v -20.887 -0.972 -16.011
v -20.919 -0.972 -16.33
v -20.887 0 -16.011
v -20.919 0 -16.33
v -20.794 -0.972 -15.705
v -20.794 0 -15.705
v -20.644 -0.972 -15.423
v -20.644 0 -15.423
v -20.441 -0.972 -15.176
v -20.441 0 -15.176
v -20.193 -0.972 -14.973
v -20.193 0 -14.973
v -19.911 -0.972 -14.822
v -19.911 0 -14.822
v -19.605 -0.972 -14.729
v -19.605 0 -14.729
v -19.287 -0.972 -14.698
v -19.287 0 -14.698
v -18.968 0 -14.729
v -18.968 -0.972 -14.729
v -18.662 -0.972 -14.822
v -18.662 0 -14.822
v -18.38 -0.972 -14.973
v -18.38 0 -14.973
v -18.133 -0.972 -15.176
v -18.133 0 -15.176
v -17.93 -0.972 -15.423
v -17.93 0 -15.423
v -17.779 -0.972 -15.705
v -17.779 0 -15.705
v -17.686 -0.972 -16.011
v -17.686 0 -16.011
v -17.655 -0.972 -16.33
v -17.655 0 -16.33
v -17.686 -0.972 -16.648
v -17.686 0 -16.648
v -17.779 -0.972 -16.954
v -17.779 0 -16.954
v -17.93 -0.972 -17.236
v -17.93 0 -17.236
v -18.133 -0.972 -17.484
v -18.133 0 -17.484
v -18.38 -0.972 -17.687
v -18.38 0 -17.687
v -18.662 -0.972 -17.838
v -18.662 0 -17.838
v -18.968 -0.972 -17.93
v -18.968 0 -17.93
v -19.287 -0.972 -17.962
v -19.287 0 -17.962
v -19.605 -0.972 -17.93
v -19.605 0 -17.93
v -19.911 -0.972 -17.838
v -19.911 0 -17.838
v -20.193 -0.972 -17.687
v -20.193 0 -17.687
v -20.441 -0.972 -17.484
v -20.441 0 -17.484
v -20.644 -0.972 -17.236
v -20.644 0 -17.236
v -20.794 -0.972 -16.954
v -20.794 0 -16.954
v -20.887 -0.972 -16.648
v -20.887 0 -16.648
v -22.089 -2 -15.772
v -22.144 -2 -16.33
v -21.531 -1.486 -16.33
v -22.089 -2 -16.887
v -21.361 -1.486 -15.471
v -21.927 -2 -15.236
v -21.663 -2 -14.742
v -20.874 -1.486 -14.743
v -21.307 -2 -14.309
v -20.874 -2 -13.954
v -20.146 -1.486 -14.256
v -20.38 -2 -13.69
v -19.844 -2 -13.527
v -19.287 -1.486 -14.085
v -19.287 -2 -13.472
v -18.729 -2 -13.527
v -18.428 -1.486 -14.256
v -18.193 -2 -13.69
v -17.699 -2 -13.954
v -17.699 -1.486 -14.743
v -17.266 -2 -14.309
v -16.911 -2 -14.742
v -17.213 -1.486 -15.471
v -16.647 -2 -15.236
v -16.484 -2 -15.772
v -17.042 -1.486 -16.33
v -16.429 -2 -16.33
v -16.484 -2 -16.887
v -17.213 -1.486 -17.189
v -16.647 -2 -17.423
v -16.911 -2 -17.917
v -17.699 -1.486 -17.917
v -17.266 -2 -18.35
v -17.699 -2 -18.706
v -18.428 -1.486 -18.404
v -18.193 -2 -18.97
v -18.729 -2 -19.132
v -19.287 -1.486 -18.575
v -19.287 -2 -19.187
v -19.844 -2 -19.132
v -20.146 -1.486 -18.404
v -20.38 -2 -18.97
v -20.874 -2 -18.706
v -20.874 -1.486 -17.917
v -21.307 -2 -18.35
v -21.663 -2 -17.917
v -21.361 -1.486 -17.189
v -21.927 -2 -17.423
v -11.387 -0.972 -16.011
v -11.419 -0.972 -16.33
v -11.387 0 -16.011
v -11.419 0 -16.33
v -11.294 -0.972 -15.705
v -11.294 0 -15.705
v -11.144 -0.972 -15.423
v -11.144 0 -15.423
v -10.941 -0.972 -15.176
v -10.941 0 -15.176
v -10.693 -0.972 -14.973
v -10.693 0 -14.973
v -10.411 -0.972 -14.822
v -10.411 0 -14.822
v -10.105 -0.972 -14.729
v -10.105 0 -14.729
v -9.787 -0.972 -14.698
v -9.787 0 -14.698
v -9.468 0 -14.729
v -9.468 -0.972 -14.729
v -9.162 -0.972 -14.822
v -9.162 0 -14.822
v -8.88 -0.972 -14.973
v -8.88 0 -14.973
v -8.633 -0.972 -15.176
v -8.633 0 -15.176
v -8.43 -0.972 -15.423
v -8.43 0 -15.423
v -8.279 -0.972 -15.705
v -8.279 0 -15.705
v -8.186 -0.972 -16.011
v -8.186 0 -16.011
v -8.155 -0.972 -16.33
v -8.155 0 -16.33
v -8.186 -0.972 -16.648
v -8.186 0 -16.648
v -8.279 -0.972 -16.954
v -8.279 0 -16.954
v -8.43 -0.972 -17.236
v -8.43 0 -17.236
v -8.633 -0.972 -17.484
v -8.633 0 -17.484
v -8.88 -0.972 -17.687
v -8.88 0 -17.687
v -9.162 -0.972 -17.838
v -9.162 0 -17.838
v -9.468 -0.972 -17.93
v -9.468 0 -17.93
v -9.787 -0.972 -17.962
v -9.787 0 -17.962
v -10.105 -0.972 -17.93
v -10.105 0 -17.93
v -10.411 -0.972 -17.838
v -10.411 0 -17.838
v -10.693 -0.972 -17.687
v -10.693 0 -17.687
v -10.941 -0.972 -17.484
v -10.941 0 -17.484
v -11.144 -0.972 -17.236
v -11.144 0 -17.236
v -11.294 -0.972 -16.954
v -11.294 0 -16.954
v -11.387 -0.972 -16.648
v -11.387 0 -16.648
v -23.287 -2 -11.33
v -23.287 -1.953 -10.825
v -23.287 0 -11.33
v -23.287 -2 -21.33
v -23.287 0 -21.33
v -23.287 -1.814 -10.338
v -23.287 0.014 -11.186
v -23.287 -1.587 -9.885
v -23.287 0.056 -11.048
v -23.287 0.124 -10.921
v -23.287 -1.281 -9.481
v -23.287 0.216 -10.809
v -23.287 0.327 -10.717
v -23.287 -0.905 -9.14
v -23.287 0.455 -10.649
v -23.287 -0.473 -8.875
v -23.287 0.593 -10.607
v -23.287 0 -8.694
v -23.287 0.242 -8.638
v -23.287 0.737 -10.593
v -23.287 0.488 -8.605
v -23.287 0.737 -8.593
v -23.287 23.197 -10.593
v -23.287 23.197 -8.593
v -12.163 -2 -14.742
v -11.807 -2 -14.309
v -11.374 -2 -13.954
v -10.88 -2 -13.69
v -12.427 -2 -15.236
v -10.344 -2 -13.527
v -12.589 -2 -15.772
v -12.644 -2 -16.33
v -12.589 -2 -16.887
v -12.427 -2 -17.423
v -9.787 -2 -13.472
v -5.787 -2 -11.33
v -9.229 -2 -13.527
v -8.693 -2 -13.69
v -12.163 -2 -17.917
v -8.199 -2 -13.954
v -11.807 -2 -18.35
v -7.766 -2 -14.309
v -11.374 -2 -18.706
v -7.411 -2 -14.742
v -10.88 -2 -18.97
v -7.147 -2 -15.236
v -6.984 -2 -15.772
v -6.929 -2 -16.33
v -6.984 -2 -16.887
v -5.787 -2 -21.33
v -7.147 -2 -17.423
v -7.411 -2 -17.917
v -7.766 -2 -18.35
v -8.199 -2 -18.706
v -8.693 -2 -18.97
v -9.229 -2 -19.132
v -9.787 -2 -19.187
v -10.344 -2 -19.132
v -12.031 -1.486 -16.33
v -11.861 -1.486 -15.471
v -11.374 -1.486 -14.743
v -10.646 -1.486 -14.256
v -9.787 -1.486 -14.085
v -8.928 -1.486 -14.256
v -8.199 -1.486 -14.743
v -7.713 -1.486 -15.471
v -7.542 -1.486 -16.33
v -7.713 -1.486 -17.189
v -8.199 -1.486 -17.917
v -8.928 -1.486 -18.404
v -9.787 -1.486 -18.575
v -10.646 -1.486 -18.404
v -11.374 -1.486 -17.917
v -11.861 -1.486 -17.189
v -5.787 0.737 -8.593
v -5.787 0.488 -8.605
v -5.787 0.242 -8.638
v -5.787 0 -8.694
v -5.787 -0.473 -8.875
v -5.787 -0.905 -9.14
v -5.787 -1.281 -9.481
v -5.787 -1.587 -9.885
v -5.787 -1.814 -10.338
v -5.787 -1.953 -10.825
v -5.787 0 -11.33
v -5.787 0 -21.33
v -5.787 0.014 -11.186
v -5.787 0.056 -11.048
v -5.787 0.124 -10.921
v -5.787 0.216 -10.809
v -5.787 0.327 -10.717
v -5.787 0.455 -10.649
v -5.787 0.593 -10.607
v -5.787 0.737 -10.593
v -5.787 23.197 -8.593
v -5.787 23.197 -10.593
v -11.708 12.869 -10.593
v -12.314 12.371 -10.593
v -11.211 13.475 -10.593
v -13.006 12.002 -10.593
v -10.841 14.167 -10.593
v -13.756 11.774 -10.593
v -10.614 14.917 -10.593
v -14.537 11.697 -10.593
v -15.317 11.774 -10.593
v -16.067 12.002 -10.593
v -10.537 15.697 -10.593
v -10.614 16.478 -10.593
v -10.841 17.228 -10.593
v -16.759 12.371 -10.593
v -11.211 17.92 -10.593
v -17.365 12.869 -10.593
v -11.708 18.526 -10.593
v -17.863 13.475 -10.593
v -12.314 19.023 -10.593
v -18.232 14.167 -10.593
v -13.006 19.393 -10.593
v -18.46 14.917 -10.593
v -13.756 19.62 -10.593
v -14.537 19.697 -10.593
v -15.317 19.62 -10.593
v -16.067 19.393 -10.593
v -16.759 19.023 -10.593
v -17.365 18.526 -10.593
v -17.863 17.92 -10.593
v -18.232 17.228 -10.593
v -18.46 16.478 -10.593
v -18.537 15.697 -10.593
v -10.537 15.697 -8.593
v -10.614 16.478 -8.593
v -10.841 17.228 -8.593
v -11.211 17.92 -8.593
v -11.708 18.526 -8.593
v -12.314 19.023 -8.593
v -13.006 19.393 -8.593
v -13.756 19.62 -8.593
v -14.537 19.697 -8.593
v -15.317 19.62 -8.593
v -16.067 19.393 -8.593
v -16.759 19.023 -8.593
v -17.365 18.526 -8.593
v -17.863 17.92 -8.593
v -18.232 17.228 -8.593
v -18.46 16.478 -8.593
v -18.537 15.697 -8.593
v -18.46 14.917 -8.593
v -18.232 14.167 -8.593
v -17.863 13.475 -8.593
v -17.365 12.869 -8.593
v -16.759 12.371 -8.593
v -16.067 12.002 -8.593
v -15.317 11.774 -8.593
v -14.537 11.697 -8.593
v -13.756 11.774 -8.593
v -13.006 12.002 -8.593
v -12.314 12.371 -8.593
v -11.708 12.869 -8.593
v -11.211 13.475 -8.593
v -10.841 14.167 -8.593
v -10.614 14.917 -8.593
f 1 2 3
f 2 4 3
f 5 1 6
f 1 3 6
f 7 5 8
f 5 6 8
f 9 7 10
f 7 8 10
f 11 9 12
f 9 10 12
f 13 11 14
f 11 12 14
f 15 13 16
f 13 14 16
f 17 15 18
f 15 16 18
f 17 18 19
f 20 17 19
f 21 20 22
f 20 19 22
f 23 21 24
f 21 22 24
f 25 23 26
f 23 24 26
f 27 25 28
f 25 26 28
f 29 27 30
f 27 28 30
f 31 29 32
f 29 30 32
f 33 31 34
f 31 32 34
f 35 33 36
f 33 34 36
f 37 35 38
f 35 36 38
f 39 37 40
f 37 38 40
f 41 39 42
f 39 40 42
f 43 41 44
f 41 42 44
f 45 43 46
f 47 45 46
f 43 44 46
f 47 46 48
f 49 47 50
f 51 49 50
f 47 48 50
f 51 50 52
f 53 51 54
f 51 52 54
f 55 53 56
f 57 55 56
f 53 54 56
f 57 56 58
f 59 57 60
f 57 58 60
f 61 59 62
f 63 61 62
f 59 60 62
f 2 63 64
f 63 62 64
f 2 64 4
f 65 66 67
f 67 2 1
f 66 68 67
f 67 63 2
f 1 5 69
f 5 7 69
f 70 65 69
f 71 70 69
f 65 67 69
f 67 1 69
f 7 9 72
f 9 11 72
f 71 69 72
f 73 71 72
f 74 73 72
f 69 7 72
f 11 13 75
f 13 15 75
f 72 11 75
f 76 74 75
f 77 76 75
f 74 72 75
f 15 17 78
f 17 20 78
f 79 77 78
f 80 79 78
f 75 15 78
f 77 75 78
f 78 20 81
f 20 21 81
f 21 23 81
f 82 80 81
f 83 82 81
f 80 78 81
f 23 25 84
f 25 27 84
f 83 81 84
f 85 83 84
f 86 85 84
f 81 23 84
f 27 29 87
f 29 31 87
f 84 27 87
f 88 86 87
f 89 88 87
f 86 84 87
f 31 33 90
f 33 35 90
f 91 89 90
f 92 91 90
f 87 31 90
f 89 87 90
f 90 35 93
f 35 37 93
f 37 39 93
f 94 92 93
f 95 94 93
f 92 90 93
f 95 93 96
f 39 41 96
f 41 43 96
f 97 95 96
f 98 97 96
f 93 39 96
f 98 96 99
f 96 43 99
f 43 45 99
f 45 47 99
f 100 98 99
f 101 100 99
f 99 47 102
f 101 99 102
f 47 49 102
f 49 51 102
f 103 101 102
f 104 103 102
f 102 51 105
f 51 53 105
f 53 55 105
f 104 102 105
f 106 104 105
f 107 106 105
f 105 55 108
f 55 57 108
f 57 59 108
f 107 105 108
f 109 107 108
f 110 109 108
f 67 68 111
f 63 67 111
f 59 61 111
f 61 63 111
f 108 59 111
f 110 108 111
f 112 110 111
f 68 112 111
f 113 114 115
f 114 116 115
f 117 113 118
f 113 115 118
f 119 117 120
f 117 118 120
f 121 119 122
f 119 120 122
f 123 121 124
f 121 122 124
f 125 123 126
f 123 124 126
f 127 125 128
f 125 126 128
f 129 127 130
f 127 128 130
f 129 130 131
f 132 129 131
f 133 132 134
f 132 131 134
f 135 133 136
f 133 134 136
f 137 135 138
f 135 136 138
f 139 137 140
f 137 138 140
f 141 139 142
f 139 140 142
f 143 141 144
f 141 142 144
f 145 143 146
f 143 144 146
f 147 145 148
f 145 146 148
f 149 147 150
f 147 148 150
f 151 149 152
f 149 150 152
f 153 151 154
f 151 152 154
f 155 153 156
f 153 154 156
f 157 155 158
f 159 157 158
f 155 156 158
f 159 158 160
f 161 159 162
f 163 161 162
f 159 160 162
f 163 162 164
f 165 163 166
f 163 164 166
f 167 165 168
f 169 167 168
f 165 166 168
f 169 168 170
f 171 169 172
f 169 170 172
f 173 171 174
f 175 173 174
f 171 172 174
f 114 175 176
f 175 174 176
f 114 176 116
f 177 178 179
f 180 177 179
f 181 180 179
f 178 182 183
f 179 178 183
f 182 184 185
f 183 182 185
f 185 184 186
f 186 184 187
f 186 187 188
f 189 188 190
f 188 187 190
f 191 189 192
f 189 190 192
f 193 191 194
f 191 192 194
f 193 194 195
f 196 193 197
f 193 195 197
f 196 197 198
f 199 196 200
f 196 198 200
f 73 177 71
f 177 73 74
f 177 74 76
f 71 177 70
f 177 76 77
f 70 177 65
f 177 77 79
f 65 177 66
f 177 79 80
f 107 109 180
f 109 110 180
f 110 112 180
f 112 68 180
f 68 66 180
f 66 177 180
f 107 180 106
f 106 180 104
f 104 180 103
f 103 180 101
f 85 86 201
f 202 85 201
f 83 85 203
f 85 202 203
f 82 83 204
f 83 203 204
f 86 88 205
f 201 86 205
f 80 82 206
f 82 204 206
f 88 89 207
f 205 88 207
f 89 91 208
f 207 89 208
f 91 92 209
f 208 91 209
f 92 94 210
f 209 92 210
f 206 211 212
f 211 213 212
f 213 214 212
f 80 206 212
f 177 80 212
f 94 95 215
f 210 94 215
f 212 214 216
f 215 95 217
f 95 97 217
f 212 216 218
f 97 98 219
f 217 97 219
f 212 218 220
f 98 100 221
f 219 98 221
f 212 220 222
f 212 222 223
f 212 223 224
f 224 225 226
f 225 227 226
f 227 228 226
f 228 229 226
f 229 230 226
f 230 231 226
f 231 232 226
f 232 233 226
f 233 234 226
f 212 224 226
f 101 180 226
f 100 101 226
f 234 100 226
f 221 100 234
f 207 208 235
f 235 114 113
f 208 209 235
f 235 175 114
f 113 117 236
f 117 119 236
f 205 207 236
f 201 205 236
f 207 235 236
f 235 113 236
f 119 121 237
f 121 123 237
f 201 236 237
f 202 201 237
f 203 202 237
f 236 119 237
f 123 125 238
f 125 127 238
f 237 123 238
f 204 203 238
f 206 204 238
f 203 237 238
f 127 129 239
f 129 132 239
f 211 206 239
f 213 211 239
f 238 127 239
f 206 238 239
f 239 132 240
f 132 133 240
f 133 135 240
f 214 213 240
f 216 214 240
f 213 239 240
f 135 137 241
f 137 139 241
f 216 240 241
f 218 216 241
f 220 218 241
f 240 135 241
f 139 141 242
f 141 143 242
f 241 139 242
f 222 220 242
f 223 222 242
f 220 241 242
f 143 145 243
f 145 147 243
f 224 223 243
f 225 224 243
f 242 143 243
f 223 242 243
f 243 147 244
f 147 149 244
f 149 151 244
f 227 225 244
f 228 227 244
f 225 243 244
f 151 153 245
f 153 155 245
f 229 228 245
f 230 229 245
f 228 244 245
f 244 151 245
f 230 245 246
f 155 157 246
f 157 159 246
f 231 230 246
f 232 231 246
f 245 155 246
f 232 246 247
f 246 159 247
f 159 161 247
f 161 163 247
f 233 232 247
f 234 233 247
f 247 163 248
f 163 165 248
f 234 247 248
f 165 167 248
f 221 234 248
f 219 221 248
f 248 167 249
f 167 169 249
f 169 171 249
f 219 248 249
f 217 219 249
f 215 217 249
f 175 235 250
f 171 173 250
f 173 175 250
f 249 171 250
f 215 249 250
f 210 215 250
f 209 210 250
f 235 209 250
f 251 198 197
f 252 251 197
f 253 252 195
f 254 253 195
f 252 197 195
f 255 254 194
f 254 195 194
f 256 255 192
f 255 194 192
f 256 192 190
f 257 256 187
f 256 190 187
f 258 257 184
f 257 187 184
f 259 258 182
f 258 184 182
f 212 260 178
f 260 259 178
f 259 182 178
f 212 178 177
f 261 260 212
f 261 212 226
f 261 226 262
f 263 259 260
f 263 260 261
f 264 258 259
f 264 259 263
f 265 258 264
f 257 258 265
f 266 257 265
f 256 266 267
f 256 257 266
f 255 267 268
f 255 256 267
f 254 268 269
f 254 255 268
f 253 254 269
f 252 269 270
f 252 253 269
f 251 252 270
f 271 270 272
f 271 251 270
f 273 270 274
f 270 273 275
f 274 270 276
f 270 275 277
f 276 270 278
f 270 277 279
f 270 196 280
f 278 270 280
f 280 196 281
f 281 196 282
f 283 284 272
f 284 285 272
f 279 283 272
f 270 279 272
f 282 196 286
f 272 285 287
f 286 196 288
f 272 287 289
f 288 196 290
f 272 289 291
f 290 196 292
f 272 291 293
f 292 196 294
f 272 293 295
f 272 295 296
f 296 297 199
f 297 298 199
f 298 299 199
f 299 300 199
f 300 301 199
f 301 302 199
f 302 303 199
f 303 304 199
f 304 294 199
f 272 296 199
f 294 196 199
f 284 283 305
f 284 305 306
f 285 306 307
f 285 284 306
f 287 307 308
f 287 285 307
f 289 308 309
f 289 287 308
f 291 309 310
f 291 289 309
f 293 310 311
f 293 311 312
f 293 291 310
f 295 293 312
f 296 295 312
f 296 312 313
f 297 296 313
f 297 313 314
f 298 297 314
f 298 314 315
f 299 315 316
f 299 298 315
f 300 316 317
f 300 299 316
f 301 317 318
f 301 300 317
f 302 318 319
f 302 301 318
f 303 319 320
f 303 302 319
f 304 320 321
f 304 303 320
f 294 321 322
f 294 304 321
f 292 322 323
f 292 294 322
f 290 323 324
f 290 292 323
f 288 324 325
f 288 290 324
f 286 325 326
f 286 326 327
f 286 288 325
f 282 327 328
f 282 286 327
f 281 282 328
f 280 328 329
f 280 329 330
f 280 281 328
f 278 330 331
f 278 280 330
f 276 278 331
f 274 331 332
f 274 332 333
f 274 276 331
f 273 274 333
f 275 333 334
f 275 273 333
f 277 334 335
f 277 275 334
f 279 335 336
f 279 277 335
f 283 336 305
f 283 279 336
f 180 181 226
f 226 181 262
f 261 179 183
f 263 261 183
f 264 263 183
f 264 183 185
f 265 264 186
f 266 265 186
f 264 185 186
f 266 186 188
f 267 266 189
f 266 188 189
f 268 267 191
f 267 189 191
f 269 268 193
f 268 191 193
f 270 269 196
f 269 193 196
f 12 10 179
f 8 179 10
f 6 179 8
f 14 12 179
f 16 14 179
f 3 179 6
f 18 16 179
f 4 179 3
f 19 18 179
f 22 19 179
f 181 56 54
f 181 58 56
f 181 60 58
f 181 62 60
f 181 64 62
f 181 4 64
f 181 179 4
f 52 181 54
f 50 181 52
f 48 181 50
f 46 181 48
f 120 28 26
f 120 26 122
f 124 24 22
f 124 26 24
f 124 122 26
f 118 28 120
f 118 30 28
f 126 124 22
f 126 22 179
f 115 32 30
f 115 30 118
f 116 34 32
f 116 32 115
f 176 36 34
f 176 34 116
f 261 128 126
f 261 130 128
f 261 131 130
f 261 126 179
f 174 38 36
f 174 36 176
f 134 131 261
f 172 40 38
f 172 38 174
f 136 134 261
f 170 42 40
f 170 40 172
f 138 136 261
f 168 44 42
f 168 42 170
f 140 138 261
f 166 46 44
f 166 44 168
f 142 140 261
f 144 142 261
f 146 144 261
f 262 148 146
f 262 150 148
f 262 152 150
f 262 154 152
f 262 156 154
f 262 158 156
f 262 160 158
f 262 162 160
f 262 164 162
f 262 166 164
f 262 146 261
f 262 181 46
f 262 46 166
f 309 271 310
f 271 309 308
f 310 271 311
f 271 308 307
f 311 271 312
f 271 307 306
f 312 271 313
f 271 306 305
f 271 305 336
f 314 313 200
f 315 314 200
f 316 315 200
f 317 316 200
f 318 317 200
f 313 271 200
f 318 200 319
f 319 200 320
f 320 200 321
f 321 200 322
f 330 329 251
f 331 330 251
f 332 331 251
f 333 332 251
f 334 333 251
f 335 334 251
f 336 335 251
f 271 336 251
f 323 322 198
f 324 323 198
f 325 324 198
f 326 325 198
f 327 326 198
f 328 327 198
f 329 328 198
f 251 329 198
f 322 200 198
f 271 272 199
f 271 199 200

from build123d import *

# Parameters (mm, degrees)
SKETCH1_W                                         = 17.5
SKETCH1_H                                         = 35
BASE_FLANGE1_DEPTH                                = 2
SKETCH11_R                                        = 4
CUT_EXTRUDE3_DEPTH                                = 2
SKETCHED_START                                    = -23.286713287
SKETCHED_BEND3_DEPTH                              = 17.5
SKETCHED_BEND3_2_DEPTH                            = 4.7499999
SKETCHED_START_2                                  = -10.536713187
SKETCHED_BEND3_3_DEPTH                            = 4.7499999
SKETCHED_START_3                                  = -18.536713387
SKETCHED_BEND3_4_DEPTH                            = 8.0000002
SKETCHED_START_4                                  = -10.59323683
SKETCHED_BEND3_5_OUTLINE_R                        = 4
SKETCHED_BEND3_5_DEPTH                            = 2
CSK_FOR_4_FLAT_HEAD_MACHINE_SCREW_100_D           = 3.2639
CSK_FOR_4_FLAT_HEAD_MACHINE_SCREW_100_DEPTH       = 2
CSK_FOR_4_FLAT_HEAD_MACHINE_SCREW_100_CSINK_D     = 5.715
CSK_FOR_4_FLAT_HEAD_MACHINE_SCREW_100_CSINK_ANGLE = 100
CSK_FOR_4_FLAT_HEAD_MACHINE_SCREW_100_TIP         = 0.980574487


with BuildPart() as part:
    # Base-Flange1: sheet metal written as solids
    # Sketch1 → Base-Flange1 (new body)
    with BuildSketch(Plane(origin=(0, 0, 0), x_dir=(1, 0, 0), z_dir=(0, 1, 0))):
        with Locations((-14.536713287, 3.82983683)):
            Rectangle(SKETCH1_W, SKETCH1_H)
    extrude(amount=-BASE_FLANGE1_DEPTH)

    # Sketch11 → Cut-Extrude3 (cut)
    with BuildSketch(Plane(origin=(0, 0, 0), x_dir=(1, 0, 0), z_dir=(0, 1, 0))):
        with Locations(Location((-14.536713287, -6.17016317, 0), (0, 0, 270))):
            Circle(SKETCH11_R)
    extrude(amount=-CUT_EXTRUDE3_DEPTH, mode=Mode.SUBTRACT)

    # Sketched Bend3: read off the stored shape, not the designer's step
    # Sketched Bend3 outline → Sketched Bend3 (cut)
    with BuildSketch(Plane.YZ.offset(SKETCHED_START)):
        with BuildLine():
            ThreePointArc((-2, -11.32983683), (-1.443395312, -9.675569621), (0, -8.694234432))
            Line((0, -8.694234432), (0, 13.67016317))
            Line((0, 13.67016317), (-2, 13.67016317))
            Line((-2, 13.67016317), (-2, -11.32983683))
        make_face()
    extrude(amount=SKETCHED_BEND3_DEPTH, mode=Mode.SUBTRACT)

    # Sketched Bend3 2 outline → Sketched Bend3 2 (add)
    with BuildSketch(Plane.YZ.offset(SKETCHED_START)):
        with BuildLine():
            ThreePointArc((0, -11.32983683), (0.215745145, -10.808981975), (0.7366, -10.59323683))
            Line((0.7366, -10.59323683), (23.197250658, -10.59323683))
            Line((23.197250658, -10.59323683), (23.197250658, -8.59323683))
            Line((23.197250658, -8.59323683), (0.7366, -8.59323683))
            ThreePointArc((0.7366, -8.59323683), (0.364854094, -8.6186038), (0, -8.694234432))
            Line((0, -8.694234432), (0, -11.32983683))
        make_face()
    extrude(amount=SKETCHED_BEND3_2_DEPTH)

    # Sketched Bend3 3 outline → Sketched Bend3 3 (add)
    with BuildSketch(Plane.YZ.offset(SKETCHED_START_2)):
        with BuildLine():
            ThreePointArc((0, -11.32983683), (0.215745145, -10.808981975), (0.7366, -10.59323683))
            Line((0.7366, -10.59323683), (23.197250658, -10.59323683))
            Line((23.197250658, -10.59323683), (23.197250658, -8.59323683))
            Line((23.197250658, -8.59323683), (0.7366, -8.59323683))
            ThreePointArc((0.7366, -8.59323683), (0.364854094, -8.6186038), (0, -8.694234432))
            Line((0, -8.694234432), (0, -11.32983683))
        make_face()
    extrude(amount=SKETCHED_BEND3_3_DEPTH)

    # Sketched Bend3 4 outline → Sketched Bend3 4 (add)
    with BuildSketch(Plane.YZ.offset(SKETCHED_START_3)):
        with BuildLine():
            ThreePointArc((0, -11.32983683), (0.215745145, -10.808981975), (0.7366, -10.59323683))
            Line((0.7366, -10.59323683), (23.197250658, -10.59323683))
            Line((23.197250658, -10.59323683), (23.197250658, -8.59323683))
            Line((23.197250658, -8.59323683), (0.7366, -8.59323683))
            ThreePointArc((0.7366, -8.59323683), (0.364854094, -8.6186038), (0, -8.694234432))
            Line((0, -8.694234432), (0, -11.32983683))
        make_face()
    extrude(amount=SKETCHED_BEND3_4_DEPTH)

    # Sketched Bend3 5 outline → Sketched Bend3 5 (cut)
    with BuildSketch(Plane.XY.offset(SKETCHED_START_4)):
        with Locations((-14.536713287, 15.697250658)):
            Circle(SKETCHED_BEND3_5_OUTLINE_R)
    extrude(amount=SKETCHED_BEND3_5_DEPTH, mode=Mode.SUBTRACT)

    # CSK for #4 Flat Head Machine Screw (100)2
    with Locations(Plane.XZ.offset(2)):
        with Locations((-9.786713287, -16.32983683), (-19.286713287, -16.32983683)):
            CounterSinkHole(CSK_FOR_4_FLAT_HEAD_MACHINE_SCREW_100_D / 2, CSK_FOR_4_FLAT_HEAD_MACHINE_SCREW_100_CSINK_D / 2, depth=CSK_FOR_4_FLAT_HEAD_MACHINE_SCREW_100_DEPTH, counter_sink_angle=CSK_FOR_4_FLAT_HEAD_MACHINE_SCREW_100_CSINK_ANGLE)
            with Locations((0, 0, -(CSK_FOR_4_FLAT_HEAD_MACHINE_SCREW_100_DEPTH + CSK_FOR_4_FLAT_HEAD_MACHINE_SCREW_100_TIP / 2))):  # 118° drill point
                Cone(0, CSK_FOR_4_FLAT_HEAD_MACHINE_SCREW_100_D / 2, CSK_FOR_4_FLAT_HEAD_MACHINE_SCREW_100_TIP, mode=Mode.SUBTRACT)


solid = part.part
